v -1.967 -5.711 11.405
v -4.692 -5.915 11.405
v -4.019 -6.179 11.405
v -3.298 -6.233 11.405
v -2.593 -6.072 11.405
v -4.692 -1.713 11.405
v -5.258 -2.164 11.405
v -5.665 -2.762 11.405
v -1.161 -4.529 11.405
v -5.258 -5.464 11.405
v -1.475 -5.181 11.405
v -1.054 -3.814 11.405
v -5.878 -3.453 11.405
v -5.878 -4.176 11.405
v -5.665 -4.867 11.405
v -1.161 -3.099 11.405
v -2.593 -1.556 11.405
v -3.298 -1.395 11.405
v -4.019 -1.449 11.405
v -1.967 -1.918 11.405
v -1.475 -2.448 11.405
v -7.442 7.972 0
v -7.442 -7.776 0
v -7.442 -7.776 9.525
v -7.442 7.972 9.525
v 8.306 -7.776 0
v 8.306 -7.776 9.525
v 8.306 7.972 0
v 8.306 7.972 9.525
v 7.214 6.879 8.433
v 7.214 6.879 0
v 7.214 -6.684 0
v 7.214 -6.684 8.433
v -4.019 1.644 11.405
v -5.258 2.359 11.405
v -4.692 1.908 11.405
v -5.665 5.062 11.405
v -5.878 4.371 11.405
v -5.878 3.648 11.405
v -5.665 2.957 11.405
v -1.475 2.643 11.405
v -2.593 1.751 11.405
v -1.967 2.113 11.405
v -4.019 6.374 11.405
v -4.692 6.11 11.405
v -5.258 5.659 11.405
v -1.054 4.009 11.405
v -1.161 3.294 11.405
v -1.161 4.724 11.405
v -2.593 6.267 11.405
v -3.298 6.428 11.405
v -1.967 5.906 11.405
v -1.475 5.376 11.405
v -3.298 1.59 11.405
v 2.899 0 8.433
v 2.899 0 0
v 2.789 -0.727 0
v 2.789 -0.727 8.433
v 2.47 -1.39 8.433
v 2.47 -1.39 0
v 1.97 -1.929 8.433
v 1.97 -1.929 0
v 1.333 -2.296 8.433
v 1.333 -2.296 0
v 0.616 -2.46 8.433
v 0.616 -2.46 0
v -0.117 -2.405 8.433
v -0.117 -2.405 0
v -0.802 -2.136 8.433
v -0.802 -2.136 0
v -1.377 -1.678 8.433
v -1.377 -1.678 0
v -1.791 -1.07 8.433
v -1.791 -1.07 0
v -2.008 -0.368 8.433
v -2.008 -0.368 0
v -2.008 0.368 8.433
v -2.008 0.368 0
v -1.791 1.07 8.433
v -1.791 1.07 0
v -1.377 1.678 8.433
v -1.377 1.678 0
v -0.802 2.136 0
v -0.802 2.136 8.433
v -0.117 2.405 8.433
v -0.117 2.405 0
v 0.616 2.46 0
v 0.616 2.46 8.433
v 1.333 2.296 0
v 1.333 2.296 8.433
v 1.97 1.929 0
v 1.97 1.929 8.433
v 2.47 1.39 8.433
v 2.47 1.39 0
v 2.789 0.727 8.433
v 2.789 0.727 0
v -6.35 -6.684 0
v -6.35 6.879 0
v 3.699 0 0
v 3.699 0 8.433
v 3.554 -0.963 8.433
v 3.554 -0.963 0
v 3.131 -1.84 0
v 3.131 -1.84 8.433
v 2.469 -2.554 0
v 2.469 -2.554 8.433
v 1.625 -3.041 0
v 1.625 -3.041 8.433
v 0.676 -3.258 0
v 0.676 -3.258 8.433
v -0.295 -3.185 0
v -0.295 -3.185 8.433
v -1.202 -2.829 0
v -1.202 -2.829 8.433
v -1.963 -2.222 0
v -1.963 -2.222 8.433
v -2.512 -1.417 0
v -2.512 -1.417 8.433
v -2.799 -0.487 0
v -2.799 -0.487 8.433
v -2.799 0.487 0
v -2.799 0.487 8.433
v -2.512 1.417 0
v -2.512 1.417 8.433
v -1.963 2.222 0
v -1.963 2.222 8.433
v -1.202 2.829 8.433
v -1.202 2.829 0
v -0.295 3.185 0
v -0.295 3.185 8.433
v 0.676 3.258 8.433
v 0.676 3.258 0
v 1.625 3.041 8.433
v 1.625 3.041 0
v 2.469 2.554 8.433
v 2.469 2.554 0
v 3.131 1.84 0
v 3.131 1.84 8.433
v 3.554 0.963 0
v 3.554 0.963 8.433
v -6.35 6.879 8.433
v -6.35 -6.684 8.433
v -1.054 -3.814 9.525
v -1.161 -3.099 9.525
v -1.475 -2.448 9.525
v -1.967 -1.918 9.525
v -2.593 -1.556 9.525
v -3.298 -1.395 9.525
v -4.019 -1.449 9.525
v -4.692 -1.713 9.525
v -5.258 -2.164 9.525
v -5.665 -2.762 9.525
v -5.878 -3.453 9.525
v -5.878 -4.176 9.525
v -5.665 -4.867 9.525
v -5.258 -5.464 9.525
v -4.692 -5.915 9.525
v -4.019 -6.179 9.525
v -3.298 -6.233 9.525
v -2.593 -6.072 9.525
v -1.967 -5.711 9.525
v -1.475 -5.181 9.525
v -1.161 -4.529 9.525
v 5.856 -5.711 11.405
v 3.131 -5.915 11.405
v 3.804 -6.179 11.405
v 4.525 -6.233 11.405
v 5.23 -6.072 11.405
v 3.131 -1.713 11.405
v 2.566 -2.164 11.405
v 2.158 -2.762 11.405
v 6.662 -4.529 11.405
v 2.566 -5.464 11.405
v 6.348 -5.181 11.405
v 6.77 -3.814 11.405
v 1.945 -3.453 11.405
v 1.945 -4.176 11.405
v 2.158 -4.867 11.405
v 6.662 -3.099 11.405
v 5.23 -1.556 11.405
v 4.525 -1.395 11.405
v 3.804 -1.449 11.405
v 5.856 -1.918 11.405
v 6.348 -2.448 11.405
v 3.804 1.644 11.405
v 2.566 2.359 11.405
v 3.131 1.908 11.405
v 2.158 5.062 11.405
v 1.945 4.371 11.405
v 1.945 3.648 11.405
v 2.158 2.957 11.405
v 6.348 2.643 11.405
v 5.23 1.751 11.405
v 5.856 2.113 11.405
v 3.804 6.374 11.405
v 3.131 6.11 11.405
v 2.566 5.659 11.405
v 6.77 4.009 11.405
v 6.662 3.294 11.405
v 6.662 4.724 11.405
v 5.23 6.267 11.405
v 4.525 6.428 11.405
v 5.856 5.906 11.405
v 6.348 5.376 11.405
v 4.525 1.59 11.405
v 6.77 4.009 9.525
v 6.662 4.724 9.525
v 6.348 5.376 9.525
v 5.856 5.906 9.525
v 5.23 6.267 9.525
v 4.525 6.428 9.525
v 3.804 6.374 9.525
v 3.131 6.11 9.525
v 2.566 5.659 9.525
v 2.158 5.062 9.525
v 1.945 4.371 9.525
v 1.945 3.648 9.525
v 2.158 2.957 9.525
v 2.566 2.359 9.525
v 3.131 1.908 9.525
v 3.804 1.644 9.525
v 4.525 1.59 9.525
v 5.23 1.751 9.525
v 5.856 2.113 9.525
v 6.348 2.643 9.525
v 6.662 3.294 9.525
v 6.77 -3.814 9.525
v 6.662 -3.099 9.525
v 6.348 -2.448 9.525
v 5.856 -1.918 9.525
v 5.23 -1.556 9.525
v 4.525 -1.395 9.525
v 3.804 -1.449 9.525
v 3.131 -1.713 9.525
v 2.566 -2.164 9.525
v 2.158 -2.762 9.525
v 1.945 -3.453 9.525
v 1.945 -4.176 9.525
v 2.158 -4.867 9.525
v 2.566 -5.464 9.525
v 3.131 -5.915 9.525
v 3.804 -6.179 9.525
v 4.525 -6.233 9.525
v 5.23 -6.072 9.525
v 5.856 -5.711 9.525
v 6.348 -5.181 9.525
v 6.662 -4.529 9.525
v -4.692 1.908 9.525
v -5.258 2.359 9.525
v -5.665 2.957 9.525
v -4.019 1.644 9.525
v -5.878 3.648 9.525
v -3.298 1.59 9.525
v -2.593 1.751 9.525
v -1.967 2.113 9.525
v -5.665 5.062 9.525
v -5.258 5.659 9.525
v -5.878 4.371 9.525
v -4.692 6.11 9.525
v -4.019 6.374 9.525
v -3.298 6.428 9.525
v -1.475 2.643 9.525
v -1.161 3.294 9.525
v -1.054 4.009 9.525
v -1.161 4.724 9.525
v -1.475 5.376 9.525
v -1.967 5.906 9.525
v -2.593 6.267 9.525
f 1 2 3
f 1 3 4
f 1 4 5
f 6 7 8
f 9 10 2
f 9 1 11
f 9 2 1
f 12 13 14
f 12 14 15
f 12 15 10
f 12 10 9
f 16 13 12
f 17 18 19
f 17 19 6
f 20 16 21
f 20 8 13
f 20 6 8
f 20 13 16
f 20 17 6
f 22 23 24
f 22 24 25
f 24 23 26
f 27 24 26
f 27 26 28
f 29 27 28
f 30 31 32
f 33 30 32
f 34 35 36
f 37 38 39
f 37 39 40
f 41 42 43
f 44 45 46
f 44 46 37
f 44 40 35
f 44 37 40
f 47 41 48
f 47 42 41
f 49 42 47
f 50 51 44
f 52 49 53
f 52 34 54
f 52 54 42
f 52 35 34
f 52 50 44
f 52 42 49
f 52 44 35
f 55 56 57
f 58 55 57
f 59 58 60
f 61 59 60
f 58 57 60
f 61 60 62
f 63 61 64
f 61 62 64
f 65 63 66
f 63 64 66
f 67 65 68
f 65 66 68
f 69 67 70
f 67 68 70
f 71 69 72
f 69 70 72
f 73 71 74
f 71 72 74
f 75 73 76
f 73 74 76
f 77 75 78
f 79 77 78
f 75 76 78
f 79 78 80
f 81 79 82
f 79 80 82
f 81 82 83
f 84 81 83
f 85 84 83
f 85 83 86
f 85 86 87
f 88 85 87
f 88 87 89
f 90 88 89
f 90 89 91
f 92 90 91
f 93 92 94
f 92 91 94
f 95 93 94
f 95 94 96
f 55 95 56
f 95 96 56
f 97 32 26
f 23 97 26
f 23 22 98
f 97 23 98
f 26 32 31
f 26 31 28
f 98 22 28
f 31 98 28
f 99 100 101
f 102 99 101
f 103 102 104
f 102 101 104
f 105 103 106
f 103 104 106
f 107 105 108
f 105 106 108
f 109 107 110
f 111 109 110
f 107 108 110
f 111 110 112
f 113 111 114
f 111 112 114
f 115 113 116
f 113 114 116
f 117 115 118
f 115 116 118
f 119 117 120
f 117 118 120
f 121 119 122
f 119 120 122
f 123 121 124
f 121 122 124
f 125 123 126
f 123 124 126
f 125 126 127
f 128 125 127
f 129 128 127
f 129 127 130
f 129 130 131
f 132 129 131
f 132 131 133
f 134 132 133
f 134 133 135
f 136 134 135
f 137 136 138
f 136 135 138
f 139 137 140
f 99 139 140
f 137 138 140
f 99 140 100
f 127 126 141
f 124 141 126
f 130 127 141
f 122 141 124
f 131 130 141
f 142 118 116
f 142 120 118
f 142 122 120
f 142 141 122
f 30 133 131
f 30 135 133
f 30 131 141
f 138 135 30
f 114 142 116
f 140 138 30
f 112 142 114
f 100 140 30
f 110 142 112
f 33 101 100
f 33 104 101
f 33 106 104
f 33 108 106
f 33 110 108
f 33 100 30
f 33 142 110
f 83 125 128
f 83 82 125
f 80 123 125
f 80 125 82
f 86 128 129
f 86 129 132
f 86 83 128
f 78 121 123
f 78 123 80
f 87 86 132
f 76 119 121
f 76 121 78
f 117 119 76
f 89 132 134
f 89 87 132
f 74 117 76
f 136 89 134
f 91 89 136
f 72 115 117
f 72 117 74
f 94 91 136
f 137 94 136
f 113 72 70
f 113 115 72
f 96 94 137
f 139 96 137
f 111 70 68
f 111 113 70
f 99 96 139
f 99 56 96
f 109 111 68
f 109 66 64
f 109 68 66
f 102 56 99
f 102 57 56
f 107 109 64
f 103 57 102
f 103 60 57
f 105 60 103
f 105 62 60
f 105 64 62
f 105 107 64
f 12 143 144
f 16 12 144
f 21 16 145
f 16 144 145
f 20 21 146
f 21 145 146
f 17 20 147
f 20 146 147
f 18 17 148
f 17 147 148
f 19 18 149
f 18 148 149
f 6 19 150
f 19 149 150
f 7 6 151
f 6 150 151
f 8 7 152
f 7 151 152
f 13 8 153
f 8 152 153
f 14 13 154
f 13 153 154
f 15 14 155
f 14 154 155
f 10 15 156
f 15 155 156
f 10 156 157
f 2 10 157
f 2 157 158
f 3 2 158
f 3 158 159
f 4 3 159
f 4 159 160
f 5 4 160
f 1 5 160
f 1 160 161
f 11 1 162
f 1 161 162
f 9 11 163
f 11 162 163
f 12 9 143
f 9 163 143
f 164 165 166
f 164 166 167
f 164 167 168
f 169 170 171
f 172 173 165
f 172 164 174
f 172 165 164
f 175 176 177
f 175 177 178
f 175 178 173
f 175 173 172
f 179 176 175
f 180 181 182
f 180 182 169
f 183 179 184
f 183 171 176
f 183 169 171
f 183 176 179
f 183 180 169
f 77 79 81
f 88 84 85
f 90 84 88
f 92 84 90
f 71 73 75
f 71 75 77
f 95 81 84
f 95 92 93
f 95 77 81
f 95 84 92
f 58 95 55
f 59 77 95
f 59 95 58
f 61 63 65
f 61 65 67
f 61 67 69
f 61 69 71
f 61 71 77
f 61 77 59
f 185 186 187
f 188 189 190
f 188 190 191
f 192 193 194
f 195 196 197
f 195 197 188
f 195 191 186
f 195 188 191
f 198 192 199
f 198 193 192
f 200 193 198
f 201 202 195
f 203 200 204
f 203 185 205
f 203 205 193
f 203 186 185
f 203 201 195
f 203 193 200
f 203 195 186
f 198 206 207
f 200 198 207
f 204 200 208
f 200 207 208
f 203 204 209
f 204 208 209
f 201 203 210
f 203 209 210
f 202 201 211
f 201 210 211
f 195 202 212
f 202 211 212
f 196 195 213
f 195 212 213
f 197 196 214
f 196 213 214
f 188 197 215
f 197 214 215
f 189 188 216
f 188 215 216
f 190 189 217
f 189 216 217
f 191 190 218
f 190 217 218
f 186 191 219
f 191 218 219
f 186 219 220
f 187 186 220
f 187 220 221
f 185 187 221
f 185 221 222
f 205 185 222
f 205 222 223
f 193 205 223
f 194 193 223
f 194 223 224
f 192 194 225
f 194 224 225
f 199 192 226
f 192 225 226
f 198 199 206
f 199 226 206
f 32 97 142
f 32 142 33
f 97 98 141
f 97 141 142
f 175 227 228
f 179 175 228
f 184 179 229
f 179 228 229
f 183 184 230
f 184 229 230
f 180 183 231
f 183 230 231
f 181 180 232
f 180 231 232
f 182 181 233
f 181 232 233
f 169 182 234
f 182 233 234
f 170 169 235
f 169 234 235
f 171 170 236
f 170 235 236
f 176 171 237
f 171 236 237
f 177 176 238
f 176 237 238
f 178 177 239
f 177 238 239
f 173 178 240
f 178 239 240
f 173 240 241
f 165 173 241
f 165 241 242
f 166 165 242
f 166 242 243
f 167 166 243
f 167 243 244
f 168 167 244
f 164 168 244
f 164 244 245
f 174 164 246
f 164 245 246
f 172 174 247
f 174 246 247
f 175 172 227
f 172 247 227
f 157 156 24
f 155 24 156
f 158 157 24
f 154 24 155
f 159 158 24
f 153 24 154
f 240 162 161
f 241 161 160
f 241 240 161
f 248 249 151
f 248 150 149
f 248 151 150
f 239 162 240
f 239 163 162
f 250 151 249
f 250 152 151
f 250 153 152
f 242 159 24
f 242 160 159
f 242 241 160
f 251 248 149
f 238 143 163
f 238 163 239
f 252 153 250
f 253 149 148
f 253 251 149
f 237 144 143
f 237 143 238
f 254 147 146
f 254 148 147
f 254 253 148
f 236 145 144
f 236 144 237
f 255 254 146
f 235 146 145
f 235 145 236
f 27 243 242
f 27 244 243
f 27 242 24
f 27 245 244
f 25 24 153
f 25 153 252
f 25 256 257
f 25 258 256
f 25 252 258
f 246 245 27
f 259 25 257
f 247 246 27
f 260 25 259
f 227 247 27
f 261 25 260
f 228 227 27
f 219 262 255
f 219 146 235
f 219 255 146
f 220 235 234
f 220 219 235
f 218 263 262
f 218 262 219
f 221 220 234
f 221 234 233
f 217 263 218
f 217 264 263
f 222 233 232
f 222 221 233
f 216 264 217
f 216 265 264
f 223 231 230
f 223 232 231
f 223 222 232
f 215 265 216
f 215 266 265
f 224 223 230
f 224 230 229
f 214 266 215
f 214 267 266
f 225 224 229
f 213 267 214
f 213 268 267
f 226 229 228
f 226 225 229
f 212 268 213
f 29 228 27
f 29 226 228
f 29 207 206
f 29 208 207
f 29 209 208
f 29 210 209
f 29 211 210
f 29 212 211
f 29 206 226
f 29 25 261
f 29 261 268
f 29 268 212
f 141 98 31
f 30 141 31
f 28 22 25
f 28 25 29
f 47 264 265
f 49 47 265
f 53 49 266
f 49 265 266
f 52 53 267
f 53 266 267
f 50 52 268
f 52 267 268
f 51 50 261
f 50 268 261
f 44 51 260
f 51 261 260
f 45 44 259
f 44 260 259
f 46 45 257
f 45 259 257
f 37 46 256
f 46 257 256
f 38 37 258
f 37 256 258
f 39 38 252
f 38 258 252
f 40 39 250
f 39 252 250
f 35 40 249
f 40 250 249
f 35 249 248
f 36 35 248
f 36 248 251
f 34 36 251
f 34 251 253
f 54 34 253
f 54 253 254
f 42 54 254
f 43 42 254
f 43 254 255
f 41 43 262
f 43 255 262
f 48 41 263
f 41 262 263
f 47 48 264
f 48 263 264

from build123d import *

# Parameters (mm, degrees)
F0_W     = 15.748
F0_H     = 15.748
F1_DEPTH = 9.525
F2_R     = 2.4257
F3_DEPTH = 1.8796
F4_W     = 13.5636
F4_H     = 13.5636
F5_DEPTH = 8.4328
F6_R     = 3.267
F7_DEPTH = 8.4328
F8_R     = 2.467
F9_DEPTH = 8.4328


with BuildPart() as f1:
    # F0 (on Top) → F1 (new body)
    with BuildSketch(Plane.XY):
        with Locations((0.432258, 0.097535)):
            Rectangle(F0_W, F0_H)
    extrude(amount=F1_DEPTH)

    # F2 (on face) → F3 (join)
    with BuildSketch(Plane.XY.offset(9.525)):
        with Locations((-3.479342, 4.009135)):
            Circle(F2_R)
        with Locations((4.343858, 4.009135)):
            Circle(F2_R)
        with Locations((-3.479342, -3.814065)):
            Circle(F2_R)
        with Locations((4.343858, -3.814065)):
            Circle(F2_R)
    extrude(amount=F3_DEPTH)

    # F4 (on face) → F5 (cut)
    with BuildSketch(Plane(origin=(0, 0, 0), x_dir=(1, 0, 0), z_dir=(0, 0, -1))):
        with Locations((0.432258, -0.097535)):
            Rectangle(F4_W, F4_H)
    extrude(amount=-F5_DEPTH, mode=Mode.SUBTRACT)

    # F6 (on face) → F7 (join)
    with BuildSketch(Plane(origin=(0, 0, 8.4328), x_dir=(1, 0, 0), z_dir=(0, 0, -1))):
        with Locations((0.431654, 0)):
            Circle(F6_R)
    extrude(amount=F7_DEPTH)

    # F8 (on face) → F9 (cut)
    with BuildSketch(Plane(origin=(0, 0, 0), x_dir=(1, 0, 0), z_dir=(0, 0, -1))):
        with Locations((0.431654, 0)):
            Circle(F8_R)
    extrude(amount=-F9_DEPTH, mode=Mode.SUBTRACT)


solid = f1.part
